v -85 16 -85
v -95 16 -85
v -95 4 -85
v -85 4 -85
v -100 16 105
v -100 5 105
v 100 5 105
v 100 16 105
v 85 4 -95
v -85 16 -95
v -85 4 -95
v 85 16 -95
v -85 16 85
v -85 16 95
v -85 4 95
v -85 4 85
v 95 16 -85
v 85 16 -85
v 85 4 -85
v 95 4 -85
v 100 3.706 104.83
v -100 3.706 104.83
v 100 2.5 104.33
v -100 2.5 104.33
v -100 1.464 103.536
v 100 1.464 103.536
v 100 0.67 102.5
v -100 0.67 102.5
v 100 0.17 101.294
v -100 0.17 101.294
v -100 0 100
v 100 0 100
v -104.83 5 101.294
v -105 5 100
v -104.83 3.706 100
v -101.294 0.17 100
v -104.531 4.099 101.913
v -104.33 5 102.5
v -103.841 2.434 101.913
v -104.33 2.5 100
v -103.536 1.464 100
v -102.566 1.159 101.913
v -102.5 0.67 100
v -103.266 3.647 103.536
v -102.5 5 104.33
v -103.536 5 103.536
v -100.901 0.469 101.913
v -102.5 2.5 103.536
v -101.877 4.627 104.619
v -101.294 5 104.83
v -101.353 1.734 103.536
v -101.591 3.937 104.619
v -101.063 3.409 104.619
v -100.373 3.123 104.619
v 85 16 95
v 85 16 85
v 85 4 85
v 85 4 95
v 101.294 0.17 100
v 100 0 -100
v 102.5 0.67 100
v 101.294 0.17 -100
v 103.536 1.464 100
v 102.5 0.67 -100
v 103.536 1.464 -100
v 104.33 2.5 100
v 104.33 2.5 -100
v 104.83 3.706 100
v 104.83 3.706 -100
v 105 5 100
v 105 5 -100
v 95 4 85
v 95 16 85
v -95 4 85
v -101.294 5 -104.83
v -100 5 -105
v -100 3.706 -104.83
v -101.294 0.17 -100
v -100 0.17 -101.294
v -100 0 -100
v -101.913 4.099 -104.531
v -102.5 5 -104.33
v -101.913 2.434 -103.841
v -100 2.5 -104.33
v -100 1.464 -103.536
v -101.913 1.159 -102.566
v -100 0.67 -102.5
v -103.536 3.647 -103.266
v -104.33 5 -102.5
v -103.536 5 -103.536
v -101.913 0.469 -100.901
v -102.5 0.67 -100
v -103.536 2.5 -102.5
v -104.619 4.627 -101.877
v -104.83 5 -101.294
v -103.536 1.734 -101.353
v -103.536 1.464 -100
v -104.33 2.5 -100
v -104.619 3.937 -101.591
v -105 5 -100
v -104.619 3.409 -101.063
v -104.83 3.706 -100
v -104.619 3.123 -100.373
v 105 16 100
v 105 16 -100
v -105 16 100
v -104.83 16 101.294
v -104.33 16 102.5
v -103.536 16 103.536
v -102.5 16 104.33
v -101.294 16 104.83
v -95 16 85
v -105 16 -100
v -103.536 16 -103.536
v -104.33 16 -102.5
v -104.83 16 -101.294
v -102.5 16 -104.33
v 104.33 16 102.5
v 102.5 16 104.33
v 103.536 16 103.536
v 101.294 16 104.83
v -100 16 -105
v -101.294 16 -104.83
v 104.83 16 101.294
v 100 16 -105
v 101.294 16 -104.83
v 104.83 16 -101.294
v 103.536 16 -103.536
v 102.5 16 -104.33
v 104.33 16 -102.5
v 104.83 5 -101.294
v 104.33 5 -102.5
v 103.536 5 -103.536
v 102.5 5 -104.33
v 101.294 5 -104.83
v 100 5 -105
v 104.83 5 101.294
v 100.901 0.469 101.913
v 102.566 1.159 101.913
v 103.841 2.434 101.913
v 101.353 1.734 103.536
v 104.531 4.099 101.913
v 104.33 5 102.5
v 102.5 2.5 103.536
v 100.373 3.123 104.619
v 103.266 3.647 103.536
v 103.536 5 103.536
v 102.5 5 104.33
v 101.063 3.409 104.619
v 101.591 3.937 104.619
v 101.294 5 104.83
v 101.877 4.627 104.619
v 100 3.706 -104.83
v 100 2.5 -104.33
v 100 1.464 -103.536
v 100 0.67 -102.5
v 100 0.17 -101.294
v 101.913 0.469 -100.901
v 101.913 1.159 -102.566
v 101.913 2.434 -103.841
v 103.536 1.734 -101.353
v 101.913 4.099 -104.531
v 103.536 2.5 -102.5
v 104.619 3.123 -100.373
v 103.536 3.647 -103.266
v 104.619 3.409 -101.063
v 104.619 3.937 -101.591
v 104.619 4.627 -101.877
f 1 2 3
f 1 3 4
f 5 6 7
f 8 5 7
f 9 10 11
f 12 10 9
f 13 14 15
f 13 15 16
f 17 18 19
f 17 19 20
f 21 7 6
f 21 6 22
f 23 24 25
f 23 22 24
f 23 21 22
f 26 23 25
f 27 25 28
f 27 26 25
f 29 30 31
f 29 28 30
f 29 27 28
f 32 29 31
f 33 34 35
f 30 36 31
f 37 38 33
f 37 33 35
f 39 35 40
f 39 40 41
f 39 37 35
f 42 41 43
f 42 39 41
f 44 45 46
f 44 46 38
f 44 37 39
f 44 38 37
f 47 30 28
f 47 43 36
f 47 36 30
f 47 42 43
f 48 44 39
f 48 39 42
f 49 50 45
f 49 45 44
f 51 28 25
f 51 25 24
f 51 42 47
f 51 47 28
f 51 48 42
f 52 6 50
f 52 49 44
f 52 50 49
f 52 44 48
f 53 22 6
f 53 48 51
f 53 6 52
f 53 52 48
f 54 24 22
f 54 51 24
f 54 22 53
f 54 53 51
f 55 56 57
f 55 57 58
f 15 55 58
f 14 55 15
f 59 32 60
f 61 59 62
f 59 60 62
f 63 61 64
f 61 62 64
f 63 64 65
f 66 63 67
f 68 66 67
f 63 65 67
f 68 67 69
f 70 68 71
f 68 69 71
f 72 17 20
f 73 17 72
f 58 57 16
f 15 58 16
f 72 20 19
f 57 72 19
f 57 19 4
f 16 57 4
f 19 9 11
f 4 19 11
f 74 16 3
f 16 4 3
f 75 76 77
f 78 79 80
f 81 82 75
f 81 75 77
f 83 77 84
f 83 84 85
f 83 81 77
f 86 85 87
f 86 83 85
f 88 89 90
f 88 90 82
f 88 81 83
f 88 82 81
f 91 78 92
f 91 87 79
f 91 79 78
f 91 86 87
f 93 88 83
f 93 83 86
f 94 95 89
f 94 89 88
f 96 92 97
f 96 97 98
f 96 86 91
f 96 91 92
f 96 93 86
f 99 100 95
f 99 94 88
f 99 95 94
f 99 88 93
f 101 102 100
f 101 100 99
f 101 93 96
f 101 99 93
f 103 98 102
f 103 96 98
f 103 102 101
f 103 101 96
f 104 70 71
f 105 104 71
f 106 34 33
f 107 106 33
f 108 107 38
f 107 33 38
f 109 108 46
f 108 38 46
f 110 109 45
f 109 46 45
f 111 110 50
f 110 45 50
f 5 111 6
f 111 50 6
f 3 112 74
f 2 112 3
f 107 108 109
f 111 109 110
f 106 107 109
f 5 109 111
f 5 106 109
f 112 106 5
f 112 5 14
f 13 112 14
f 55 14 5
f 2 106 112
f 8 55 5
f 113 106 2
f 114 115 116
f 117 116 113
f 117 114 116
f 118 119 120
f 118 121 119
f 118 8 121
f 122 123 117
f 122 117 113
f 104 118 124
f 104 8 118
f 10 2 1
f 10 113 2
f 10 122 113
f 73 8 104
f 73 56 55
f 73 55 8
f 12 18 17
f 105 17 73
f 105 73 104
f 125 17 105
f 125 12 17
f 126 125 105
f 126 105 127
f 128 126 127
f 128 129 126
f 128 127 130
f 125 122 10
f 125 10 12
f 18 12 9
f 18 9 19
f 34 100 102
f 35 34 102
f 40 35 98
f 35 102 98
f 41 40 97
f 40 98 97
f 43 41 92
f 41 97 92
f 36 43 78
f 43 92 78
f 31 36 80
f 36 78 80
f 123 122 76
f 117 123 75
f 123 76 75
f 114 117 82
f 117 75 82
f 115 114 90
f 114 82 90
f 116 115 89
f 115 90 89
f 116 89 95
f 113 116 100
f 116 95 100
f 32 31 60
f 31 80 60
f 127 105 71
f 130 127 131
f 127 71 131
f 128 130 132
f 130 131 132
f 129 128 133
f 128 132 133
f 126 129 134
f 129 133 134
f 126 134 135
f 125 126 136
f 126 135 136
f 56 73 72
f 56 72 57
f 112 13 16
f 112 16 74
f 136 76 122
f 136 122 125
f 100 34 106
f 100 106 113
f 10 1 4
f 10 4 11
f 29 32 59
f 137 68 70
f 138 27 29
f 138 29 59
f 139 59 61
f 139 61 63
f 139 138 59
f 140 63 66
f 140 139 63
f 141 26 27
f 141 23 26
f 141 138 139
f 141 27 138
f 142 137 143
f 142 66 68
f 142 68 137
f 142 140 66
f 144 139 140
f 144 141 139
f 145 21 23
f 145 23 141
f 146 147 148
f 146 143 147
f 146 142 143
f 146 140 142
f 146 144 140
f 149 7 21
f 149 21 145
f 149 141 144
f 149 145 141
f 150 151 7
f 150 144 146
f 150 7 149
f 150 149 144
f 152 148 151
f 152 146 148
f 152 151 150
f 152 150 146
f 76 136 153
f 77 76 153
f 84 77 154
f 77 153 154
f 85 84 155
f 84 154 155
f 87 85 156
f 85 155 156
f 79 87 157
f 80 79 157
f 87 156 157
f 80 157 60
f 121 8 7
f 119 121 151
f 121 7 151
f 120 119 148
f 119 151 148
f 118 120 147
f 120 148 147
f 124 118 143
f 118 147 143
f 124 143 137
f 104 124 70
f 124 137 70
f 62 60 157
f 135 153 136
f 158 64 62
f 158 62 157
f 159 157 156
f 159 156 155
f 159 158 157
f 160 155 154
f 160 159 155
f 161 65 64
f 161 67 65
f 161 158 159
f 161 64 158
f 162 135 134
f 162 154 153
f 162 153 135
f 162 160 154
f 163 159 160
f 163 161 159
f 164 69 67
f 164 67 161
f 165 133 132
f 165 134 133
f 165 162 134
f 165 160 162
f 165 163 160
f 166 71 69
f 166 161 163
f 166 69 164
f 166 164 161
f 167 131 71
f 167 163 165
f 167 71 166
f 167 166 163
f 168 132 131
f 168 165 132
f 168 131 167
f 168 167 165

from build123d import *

# Parameters (mm, degrees)
SKETCH1_W          = 210
SKETCH1_H          = 210
BASE_DEPTH         = 16
CUT_EXTRUDE1_DEPTH = 12
FILLET1_R          = 5
FILLET2_R          = 5


with BuildPart() as part:
    # Sketch1 → Base (new body)
    with BuildSketch(Plane(origin=(0, 0, 0), x_dir=(1, 0, 0), z_dir=(0, 1, 0))):
        Rectangle(SKETCH1_W, SKETCH1_H)
    extrude(amount=BASE_DEPTH)

    # Sketch3 → Cut-Extrude1 (cut)
    with BuildSketch(Plane(origin=(0, 16, 0), x_dir=(1, 0, 0), z_dir=(0, 1, 0))):
        Polygon((-85, 95), (85, 95), (85, 85), (95, 85), (95, -85), (85, -85), (85, -95), (-85, -95), (-85, -85), (-95, -85), (-95, 85), (-85, 85), align=None)
    extrude(amount=-CUT_EXTRUDE1_DEPTH, mode=Mode.SUBTRACT)

    # Fillet1
    fillet1_edges = [part.edges().sort_by_distance(p)[0] for p in [
        (0, 0, 105),
        (-105, 0, 0),
        (0, 0, -105),
        (105, 0, 0),
    ]]
    fillet(fillet1_edges, radius=FILLET1_R)

    # Fillet2
    # the kernel refuses this fillet: 5 mm, written as the material it takes off along each edge
    with BuildSketch(Plane(origin=(100, 5, 100), x_dir=(1, 0, 0), z_dir=(0, 0, 1))) as fillet2_piece_1_section:
        Polygon((0, 0), (FILLET2_R, 0), (FILLET2_R, -FILLET2_R), (0, -FILLET2_R), align=None)
    fillet2_piece_1 = extrude(amount=FILLET2_R, mode=Mode.PRIVATE)
    fillet2_piece_1 = fillet2_piece_1 - Plane(origin=(100, 5, 100), x_dir=(-0.7071067811865475, 0.7071067811865475, 0), z_dir=(0, 0, 1)) * Sphere(FILLET2_R, mode=Mode.PRIVATE)
    add(fillet2_piece_1, mode=Mode.SUBTRACT)
    with BuildSketch(Plane(origin=(-100, 5, 100), x_dir=(-1, 0, 0), z_dir=(0, 0, 1))) as fillet2_piece_2_section:
        Polygon((0, 0), (FILLET2_R, 0), (FILLET2_R, FILLET2_R), (0, FILLET2_R), align=None)
    fillet2_piece_2 = extrude(amount=FILLET2_R, mode=Mode.PRIVATE)
    fillet2_piece_2 = fillet2_piece_2 - Plane(origin=(-100, 5, 100), x_dir=(0.7071067811865475, 0.7071067811865475, 0), z_dir=(0, 0, 1)) * Sphere(FILLET2_R, mode=Mode.PRIVATE)
    add(fillet2_piece_2, mode=Mode.SUBTRACT)
    with BuildSketch(Plane(origin=(100, 5, -100), x_dir=(0, 0, -1), z_dir=(1, 0, 0))) as fillet2_piece_3_section:
        Polygon((0, 0), (FILLET2_R, 0), (FILLET2_R, -FILLET2_R), (0, -FILLET2_R), align=None)
    fillet2_piece_3 = extrude(amount=FILLET2_R, mode=Mode.PRIVATE)
    fillet2_piece_3 = fillet2_piece_3 - Plane(origin=(100, 5, -100), x_dir=(0, 0.7071067811865475, 0.7071067811865475), z_dir=(1, 0, 0)) * Sphere(FILLET2_R, mode=Mode.PRIVATE)
    add(fillet2_piece_3, mode=Mode.SUBTRACT)
    with BuildSketch(Plane(origin=(-100, 5, -100), x_dir=(0, 0, -1), z_dir=(-1, 0, 0))) as fillet2_piece_4_section:
        Polygon((0, 0), (FILLET2_R, 0), (FILLET2_R, FILLET2_R), (0, FILLET2_R), align=None)
    fillet2_piece_4 = extrude(amount=FILLET2_R, mode=Mode.PRIVATE)
    fillet2_piece_4 = fillet2_piece_4 - Plane(origin=(-100, 5, -100), x_dir=(0, 0.7071067811865475, 0.7071067811865475), z_dir=(-1, 0, 0)) * Sphere(FILLET2_R, mode=Mode.PRIVATE)
    add(fillet2_piece_4, mode=Mode.SUBTRACT)
    with BuildSketch(Plane(origin=(105, 5, 105), x_dir=(-1, 0, 0), z_dir=(0, 1, 0)), Plane(origin=(105, 5, -105), x_dir=(0, 0, 1), z_dir=(0, 1, 0))) as fillet2_piece_5:
        with BuildLine():
            CenterArc((FILLET2_R, -FILLET2_R), FILLET2_R, 90, 90)
            Line((0, -FILLET2_R), (0, 0))
            Line((0, 0), (FILLET2_R, 0))
        make_face()
    extrude(amount=23.5, mode=Mode.SUBTRACT)
    with BuildSketch(Plane(origin=(-105, 5, 105), x_dir=(1, 0, 0), z_dir=(0, 1, 0)), Plane(origin=(-105, 5, -105), x_dir=(0, 0, 1), z_dir=(0, 1, 0))) as fillet2_piece_6:
        with BuildLine():
            CenterArc((FILLET2_R, FILLET2_R), FILLET2_R, 180, 90)
            Line((0, FILLET2_R), (0, 0))
            Line((0, 0), (FILLET2_R, 0))
        make_face()
    extrude(amount=23.5, mode=Mode.SUBTRACT)


solid = part.part
